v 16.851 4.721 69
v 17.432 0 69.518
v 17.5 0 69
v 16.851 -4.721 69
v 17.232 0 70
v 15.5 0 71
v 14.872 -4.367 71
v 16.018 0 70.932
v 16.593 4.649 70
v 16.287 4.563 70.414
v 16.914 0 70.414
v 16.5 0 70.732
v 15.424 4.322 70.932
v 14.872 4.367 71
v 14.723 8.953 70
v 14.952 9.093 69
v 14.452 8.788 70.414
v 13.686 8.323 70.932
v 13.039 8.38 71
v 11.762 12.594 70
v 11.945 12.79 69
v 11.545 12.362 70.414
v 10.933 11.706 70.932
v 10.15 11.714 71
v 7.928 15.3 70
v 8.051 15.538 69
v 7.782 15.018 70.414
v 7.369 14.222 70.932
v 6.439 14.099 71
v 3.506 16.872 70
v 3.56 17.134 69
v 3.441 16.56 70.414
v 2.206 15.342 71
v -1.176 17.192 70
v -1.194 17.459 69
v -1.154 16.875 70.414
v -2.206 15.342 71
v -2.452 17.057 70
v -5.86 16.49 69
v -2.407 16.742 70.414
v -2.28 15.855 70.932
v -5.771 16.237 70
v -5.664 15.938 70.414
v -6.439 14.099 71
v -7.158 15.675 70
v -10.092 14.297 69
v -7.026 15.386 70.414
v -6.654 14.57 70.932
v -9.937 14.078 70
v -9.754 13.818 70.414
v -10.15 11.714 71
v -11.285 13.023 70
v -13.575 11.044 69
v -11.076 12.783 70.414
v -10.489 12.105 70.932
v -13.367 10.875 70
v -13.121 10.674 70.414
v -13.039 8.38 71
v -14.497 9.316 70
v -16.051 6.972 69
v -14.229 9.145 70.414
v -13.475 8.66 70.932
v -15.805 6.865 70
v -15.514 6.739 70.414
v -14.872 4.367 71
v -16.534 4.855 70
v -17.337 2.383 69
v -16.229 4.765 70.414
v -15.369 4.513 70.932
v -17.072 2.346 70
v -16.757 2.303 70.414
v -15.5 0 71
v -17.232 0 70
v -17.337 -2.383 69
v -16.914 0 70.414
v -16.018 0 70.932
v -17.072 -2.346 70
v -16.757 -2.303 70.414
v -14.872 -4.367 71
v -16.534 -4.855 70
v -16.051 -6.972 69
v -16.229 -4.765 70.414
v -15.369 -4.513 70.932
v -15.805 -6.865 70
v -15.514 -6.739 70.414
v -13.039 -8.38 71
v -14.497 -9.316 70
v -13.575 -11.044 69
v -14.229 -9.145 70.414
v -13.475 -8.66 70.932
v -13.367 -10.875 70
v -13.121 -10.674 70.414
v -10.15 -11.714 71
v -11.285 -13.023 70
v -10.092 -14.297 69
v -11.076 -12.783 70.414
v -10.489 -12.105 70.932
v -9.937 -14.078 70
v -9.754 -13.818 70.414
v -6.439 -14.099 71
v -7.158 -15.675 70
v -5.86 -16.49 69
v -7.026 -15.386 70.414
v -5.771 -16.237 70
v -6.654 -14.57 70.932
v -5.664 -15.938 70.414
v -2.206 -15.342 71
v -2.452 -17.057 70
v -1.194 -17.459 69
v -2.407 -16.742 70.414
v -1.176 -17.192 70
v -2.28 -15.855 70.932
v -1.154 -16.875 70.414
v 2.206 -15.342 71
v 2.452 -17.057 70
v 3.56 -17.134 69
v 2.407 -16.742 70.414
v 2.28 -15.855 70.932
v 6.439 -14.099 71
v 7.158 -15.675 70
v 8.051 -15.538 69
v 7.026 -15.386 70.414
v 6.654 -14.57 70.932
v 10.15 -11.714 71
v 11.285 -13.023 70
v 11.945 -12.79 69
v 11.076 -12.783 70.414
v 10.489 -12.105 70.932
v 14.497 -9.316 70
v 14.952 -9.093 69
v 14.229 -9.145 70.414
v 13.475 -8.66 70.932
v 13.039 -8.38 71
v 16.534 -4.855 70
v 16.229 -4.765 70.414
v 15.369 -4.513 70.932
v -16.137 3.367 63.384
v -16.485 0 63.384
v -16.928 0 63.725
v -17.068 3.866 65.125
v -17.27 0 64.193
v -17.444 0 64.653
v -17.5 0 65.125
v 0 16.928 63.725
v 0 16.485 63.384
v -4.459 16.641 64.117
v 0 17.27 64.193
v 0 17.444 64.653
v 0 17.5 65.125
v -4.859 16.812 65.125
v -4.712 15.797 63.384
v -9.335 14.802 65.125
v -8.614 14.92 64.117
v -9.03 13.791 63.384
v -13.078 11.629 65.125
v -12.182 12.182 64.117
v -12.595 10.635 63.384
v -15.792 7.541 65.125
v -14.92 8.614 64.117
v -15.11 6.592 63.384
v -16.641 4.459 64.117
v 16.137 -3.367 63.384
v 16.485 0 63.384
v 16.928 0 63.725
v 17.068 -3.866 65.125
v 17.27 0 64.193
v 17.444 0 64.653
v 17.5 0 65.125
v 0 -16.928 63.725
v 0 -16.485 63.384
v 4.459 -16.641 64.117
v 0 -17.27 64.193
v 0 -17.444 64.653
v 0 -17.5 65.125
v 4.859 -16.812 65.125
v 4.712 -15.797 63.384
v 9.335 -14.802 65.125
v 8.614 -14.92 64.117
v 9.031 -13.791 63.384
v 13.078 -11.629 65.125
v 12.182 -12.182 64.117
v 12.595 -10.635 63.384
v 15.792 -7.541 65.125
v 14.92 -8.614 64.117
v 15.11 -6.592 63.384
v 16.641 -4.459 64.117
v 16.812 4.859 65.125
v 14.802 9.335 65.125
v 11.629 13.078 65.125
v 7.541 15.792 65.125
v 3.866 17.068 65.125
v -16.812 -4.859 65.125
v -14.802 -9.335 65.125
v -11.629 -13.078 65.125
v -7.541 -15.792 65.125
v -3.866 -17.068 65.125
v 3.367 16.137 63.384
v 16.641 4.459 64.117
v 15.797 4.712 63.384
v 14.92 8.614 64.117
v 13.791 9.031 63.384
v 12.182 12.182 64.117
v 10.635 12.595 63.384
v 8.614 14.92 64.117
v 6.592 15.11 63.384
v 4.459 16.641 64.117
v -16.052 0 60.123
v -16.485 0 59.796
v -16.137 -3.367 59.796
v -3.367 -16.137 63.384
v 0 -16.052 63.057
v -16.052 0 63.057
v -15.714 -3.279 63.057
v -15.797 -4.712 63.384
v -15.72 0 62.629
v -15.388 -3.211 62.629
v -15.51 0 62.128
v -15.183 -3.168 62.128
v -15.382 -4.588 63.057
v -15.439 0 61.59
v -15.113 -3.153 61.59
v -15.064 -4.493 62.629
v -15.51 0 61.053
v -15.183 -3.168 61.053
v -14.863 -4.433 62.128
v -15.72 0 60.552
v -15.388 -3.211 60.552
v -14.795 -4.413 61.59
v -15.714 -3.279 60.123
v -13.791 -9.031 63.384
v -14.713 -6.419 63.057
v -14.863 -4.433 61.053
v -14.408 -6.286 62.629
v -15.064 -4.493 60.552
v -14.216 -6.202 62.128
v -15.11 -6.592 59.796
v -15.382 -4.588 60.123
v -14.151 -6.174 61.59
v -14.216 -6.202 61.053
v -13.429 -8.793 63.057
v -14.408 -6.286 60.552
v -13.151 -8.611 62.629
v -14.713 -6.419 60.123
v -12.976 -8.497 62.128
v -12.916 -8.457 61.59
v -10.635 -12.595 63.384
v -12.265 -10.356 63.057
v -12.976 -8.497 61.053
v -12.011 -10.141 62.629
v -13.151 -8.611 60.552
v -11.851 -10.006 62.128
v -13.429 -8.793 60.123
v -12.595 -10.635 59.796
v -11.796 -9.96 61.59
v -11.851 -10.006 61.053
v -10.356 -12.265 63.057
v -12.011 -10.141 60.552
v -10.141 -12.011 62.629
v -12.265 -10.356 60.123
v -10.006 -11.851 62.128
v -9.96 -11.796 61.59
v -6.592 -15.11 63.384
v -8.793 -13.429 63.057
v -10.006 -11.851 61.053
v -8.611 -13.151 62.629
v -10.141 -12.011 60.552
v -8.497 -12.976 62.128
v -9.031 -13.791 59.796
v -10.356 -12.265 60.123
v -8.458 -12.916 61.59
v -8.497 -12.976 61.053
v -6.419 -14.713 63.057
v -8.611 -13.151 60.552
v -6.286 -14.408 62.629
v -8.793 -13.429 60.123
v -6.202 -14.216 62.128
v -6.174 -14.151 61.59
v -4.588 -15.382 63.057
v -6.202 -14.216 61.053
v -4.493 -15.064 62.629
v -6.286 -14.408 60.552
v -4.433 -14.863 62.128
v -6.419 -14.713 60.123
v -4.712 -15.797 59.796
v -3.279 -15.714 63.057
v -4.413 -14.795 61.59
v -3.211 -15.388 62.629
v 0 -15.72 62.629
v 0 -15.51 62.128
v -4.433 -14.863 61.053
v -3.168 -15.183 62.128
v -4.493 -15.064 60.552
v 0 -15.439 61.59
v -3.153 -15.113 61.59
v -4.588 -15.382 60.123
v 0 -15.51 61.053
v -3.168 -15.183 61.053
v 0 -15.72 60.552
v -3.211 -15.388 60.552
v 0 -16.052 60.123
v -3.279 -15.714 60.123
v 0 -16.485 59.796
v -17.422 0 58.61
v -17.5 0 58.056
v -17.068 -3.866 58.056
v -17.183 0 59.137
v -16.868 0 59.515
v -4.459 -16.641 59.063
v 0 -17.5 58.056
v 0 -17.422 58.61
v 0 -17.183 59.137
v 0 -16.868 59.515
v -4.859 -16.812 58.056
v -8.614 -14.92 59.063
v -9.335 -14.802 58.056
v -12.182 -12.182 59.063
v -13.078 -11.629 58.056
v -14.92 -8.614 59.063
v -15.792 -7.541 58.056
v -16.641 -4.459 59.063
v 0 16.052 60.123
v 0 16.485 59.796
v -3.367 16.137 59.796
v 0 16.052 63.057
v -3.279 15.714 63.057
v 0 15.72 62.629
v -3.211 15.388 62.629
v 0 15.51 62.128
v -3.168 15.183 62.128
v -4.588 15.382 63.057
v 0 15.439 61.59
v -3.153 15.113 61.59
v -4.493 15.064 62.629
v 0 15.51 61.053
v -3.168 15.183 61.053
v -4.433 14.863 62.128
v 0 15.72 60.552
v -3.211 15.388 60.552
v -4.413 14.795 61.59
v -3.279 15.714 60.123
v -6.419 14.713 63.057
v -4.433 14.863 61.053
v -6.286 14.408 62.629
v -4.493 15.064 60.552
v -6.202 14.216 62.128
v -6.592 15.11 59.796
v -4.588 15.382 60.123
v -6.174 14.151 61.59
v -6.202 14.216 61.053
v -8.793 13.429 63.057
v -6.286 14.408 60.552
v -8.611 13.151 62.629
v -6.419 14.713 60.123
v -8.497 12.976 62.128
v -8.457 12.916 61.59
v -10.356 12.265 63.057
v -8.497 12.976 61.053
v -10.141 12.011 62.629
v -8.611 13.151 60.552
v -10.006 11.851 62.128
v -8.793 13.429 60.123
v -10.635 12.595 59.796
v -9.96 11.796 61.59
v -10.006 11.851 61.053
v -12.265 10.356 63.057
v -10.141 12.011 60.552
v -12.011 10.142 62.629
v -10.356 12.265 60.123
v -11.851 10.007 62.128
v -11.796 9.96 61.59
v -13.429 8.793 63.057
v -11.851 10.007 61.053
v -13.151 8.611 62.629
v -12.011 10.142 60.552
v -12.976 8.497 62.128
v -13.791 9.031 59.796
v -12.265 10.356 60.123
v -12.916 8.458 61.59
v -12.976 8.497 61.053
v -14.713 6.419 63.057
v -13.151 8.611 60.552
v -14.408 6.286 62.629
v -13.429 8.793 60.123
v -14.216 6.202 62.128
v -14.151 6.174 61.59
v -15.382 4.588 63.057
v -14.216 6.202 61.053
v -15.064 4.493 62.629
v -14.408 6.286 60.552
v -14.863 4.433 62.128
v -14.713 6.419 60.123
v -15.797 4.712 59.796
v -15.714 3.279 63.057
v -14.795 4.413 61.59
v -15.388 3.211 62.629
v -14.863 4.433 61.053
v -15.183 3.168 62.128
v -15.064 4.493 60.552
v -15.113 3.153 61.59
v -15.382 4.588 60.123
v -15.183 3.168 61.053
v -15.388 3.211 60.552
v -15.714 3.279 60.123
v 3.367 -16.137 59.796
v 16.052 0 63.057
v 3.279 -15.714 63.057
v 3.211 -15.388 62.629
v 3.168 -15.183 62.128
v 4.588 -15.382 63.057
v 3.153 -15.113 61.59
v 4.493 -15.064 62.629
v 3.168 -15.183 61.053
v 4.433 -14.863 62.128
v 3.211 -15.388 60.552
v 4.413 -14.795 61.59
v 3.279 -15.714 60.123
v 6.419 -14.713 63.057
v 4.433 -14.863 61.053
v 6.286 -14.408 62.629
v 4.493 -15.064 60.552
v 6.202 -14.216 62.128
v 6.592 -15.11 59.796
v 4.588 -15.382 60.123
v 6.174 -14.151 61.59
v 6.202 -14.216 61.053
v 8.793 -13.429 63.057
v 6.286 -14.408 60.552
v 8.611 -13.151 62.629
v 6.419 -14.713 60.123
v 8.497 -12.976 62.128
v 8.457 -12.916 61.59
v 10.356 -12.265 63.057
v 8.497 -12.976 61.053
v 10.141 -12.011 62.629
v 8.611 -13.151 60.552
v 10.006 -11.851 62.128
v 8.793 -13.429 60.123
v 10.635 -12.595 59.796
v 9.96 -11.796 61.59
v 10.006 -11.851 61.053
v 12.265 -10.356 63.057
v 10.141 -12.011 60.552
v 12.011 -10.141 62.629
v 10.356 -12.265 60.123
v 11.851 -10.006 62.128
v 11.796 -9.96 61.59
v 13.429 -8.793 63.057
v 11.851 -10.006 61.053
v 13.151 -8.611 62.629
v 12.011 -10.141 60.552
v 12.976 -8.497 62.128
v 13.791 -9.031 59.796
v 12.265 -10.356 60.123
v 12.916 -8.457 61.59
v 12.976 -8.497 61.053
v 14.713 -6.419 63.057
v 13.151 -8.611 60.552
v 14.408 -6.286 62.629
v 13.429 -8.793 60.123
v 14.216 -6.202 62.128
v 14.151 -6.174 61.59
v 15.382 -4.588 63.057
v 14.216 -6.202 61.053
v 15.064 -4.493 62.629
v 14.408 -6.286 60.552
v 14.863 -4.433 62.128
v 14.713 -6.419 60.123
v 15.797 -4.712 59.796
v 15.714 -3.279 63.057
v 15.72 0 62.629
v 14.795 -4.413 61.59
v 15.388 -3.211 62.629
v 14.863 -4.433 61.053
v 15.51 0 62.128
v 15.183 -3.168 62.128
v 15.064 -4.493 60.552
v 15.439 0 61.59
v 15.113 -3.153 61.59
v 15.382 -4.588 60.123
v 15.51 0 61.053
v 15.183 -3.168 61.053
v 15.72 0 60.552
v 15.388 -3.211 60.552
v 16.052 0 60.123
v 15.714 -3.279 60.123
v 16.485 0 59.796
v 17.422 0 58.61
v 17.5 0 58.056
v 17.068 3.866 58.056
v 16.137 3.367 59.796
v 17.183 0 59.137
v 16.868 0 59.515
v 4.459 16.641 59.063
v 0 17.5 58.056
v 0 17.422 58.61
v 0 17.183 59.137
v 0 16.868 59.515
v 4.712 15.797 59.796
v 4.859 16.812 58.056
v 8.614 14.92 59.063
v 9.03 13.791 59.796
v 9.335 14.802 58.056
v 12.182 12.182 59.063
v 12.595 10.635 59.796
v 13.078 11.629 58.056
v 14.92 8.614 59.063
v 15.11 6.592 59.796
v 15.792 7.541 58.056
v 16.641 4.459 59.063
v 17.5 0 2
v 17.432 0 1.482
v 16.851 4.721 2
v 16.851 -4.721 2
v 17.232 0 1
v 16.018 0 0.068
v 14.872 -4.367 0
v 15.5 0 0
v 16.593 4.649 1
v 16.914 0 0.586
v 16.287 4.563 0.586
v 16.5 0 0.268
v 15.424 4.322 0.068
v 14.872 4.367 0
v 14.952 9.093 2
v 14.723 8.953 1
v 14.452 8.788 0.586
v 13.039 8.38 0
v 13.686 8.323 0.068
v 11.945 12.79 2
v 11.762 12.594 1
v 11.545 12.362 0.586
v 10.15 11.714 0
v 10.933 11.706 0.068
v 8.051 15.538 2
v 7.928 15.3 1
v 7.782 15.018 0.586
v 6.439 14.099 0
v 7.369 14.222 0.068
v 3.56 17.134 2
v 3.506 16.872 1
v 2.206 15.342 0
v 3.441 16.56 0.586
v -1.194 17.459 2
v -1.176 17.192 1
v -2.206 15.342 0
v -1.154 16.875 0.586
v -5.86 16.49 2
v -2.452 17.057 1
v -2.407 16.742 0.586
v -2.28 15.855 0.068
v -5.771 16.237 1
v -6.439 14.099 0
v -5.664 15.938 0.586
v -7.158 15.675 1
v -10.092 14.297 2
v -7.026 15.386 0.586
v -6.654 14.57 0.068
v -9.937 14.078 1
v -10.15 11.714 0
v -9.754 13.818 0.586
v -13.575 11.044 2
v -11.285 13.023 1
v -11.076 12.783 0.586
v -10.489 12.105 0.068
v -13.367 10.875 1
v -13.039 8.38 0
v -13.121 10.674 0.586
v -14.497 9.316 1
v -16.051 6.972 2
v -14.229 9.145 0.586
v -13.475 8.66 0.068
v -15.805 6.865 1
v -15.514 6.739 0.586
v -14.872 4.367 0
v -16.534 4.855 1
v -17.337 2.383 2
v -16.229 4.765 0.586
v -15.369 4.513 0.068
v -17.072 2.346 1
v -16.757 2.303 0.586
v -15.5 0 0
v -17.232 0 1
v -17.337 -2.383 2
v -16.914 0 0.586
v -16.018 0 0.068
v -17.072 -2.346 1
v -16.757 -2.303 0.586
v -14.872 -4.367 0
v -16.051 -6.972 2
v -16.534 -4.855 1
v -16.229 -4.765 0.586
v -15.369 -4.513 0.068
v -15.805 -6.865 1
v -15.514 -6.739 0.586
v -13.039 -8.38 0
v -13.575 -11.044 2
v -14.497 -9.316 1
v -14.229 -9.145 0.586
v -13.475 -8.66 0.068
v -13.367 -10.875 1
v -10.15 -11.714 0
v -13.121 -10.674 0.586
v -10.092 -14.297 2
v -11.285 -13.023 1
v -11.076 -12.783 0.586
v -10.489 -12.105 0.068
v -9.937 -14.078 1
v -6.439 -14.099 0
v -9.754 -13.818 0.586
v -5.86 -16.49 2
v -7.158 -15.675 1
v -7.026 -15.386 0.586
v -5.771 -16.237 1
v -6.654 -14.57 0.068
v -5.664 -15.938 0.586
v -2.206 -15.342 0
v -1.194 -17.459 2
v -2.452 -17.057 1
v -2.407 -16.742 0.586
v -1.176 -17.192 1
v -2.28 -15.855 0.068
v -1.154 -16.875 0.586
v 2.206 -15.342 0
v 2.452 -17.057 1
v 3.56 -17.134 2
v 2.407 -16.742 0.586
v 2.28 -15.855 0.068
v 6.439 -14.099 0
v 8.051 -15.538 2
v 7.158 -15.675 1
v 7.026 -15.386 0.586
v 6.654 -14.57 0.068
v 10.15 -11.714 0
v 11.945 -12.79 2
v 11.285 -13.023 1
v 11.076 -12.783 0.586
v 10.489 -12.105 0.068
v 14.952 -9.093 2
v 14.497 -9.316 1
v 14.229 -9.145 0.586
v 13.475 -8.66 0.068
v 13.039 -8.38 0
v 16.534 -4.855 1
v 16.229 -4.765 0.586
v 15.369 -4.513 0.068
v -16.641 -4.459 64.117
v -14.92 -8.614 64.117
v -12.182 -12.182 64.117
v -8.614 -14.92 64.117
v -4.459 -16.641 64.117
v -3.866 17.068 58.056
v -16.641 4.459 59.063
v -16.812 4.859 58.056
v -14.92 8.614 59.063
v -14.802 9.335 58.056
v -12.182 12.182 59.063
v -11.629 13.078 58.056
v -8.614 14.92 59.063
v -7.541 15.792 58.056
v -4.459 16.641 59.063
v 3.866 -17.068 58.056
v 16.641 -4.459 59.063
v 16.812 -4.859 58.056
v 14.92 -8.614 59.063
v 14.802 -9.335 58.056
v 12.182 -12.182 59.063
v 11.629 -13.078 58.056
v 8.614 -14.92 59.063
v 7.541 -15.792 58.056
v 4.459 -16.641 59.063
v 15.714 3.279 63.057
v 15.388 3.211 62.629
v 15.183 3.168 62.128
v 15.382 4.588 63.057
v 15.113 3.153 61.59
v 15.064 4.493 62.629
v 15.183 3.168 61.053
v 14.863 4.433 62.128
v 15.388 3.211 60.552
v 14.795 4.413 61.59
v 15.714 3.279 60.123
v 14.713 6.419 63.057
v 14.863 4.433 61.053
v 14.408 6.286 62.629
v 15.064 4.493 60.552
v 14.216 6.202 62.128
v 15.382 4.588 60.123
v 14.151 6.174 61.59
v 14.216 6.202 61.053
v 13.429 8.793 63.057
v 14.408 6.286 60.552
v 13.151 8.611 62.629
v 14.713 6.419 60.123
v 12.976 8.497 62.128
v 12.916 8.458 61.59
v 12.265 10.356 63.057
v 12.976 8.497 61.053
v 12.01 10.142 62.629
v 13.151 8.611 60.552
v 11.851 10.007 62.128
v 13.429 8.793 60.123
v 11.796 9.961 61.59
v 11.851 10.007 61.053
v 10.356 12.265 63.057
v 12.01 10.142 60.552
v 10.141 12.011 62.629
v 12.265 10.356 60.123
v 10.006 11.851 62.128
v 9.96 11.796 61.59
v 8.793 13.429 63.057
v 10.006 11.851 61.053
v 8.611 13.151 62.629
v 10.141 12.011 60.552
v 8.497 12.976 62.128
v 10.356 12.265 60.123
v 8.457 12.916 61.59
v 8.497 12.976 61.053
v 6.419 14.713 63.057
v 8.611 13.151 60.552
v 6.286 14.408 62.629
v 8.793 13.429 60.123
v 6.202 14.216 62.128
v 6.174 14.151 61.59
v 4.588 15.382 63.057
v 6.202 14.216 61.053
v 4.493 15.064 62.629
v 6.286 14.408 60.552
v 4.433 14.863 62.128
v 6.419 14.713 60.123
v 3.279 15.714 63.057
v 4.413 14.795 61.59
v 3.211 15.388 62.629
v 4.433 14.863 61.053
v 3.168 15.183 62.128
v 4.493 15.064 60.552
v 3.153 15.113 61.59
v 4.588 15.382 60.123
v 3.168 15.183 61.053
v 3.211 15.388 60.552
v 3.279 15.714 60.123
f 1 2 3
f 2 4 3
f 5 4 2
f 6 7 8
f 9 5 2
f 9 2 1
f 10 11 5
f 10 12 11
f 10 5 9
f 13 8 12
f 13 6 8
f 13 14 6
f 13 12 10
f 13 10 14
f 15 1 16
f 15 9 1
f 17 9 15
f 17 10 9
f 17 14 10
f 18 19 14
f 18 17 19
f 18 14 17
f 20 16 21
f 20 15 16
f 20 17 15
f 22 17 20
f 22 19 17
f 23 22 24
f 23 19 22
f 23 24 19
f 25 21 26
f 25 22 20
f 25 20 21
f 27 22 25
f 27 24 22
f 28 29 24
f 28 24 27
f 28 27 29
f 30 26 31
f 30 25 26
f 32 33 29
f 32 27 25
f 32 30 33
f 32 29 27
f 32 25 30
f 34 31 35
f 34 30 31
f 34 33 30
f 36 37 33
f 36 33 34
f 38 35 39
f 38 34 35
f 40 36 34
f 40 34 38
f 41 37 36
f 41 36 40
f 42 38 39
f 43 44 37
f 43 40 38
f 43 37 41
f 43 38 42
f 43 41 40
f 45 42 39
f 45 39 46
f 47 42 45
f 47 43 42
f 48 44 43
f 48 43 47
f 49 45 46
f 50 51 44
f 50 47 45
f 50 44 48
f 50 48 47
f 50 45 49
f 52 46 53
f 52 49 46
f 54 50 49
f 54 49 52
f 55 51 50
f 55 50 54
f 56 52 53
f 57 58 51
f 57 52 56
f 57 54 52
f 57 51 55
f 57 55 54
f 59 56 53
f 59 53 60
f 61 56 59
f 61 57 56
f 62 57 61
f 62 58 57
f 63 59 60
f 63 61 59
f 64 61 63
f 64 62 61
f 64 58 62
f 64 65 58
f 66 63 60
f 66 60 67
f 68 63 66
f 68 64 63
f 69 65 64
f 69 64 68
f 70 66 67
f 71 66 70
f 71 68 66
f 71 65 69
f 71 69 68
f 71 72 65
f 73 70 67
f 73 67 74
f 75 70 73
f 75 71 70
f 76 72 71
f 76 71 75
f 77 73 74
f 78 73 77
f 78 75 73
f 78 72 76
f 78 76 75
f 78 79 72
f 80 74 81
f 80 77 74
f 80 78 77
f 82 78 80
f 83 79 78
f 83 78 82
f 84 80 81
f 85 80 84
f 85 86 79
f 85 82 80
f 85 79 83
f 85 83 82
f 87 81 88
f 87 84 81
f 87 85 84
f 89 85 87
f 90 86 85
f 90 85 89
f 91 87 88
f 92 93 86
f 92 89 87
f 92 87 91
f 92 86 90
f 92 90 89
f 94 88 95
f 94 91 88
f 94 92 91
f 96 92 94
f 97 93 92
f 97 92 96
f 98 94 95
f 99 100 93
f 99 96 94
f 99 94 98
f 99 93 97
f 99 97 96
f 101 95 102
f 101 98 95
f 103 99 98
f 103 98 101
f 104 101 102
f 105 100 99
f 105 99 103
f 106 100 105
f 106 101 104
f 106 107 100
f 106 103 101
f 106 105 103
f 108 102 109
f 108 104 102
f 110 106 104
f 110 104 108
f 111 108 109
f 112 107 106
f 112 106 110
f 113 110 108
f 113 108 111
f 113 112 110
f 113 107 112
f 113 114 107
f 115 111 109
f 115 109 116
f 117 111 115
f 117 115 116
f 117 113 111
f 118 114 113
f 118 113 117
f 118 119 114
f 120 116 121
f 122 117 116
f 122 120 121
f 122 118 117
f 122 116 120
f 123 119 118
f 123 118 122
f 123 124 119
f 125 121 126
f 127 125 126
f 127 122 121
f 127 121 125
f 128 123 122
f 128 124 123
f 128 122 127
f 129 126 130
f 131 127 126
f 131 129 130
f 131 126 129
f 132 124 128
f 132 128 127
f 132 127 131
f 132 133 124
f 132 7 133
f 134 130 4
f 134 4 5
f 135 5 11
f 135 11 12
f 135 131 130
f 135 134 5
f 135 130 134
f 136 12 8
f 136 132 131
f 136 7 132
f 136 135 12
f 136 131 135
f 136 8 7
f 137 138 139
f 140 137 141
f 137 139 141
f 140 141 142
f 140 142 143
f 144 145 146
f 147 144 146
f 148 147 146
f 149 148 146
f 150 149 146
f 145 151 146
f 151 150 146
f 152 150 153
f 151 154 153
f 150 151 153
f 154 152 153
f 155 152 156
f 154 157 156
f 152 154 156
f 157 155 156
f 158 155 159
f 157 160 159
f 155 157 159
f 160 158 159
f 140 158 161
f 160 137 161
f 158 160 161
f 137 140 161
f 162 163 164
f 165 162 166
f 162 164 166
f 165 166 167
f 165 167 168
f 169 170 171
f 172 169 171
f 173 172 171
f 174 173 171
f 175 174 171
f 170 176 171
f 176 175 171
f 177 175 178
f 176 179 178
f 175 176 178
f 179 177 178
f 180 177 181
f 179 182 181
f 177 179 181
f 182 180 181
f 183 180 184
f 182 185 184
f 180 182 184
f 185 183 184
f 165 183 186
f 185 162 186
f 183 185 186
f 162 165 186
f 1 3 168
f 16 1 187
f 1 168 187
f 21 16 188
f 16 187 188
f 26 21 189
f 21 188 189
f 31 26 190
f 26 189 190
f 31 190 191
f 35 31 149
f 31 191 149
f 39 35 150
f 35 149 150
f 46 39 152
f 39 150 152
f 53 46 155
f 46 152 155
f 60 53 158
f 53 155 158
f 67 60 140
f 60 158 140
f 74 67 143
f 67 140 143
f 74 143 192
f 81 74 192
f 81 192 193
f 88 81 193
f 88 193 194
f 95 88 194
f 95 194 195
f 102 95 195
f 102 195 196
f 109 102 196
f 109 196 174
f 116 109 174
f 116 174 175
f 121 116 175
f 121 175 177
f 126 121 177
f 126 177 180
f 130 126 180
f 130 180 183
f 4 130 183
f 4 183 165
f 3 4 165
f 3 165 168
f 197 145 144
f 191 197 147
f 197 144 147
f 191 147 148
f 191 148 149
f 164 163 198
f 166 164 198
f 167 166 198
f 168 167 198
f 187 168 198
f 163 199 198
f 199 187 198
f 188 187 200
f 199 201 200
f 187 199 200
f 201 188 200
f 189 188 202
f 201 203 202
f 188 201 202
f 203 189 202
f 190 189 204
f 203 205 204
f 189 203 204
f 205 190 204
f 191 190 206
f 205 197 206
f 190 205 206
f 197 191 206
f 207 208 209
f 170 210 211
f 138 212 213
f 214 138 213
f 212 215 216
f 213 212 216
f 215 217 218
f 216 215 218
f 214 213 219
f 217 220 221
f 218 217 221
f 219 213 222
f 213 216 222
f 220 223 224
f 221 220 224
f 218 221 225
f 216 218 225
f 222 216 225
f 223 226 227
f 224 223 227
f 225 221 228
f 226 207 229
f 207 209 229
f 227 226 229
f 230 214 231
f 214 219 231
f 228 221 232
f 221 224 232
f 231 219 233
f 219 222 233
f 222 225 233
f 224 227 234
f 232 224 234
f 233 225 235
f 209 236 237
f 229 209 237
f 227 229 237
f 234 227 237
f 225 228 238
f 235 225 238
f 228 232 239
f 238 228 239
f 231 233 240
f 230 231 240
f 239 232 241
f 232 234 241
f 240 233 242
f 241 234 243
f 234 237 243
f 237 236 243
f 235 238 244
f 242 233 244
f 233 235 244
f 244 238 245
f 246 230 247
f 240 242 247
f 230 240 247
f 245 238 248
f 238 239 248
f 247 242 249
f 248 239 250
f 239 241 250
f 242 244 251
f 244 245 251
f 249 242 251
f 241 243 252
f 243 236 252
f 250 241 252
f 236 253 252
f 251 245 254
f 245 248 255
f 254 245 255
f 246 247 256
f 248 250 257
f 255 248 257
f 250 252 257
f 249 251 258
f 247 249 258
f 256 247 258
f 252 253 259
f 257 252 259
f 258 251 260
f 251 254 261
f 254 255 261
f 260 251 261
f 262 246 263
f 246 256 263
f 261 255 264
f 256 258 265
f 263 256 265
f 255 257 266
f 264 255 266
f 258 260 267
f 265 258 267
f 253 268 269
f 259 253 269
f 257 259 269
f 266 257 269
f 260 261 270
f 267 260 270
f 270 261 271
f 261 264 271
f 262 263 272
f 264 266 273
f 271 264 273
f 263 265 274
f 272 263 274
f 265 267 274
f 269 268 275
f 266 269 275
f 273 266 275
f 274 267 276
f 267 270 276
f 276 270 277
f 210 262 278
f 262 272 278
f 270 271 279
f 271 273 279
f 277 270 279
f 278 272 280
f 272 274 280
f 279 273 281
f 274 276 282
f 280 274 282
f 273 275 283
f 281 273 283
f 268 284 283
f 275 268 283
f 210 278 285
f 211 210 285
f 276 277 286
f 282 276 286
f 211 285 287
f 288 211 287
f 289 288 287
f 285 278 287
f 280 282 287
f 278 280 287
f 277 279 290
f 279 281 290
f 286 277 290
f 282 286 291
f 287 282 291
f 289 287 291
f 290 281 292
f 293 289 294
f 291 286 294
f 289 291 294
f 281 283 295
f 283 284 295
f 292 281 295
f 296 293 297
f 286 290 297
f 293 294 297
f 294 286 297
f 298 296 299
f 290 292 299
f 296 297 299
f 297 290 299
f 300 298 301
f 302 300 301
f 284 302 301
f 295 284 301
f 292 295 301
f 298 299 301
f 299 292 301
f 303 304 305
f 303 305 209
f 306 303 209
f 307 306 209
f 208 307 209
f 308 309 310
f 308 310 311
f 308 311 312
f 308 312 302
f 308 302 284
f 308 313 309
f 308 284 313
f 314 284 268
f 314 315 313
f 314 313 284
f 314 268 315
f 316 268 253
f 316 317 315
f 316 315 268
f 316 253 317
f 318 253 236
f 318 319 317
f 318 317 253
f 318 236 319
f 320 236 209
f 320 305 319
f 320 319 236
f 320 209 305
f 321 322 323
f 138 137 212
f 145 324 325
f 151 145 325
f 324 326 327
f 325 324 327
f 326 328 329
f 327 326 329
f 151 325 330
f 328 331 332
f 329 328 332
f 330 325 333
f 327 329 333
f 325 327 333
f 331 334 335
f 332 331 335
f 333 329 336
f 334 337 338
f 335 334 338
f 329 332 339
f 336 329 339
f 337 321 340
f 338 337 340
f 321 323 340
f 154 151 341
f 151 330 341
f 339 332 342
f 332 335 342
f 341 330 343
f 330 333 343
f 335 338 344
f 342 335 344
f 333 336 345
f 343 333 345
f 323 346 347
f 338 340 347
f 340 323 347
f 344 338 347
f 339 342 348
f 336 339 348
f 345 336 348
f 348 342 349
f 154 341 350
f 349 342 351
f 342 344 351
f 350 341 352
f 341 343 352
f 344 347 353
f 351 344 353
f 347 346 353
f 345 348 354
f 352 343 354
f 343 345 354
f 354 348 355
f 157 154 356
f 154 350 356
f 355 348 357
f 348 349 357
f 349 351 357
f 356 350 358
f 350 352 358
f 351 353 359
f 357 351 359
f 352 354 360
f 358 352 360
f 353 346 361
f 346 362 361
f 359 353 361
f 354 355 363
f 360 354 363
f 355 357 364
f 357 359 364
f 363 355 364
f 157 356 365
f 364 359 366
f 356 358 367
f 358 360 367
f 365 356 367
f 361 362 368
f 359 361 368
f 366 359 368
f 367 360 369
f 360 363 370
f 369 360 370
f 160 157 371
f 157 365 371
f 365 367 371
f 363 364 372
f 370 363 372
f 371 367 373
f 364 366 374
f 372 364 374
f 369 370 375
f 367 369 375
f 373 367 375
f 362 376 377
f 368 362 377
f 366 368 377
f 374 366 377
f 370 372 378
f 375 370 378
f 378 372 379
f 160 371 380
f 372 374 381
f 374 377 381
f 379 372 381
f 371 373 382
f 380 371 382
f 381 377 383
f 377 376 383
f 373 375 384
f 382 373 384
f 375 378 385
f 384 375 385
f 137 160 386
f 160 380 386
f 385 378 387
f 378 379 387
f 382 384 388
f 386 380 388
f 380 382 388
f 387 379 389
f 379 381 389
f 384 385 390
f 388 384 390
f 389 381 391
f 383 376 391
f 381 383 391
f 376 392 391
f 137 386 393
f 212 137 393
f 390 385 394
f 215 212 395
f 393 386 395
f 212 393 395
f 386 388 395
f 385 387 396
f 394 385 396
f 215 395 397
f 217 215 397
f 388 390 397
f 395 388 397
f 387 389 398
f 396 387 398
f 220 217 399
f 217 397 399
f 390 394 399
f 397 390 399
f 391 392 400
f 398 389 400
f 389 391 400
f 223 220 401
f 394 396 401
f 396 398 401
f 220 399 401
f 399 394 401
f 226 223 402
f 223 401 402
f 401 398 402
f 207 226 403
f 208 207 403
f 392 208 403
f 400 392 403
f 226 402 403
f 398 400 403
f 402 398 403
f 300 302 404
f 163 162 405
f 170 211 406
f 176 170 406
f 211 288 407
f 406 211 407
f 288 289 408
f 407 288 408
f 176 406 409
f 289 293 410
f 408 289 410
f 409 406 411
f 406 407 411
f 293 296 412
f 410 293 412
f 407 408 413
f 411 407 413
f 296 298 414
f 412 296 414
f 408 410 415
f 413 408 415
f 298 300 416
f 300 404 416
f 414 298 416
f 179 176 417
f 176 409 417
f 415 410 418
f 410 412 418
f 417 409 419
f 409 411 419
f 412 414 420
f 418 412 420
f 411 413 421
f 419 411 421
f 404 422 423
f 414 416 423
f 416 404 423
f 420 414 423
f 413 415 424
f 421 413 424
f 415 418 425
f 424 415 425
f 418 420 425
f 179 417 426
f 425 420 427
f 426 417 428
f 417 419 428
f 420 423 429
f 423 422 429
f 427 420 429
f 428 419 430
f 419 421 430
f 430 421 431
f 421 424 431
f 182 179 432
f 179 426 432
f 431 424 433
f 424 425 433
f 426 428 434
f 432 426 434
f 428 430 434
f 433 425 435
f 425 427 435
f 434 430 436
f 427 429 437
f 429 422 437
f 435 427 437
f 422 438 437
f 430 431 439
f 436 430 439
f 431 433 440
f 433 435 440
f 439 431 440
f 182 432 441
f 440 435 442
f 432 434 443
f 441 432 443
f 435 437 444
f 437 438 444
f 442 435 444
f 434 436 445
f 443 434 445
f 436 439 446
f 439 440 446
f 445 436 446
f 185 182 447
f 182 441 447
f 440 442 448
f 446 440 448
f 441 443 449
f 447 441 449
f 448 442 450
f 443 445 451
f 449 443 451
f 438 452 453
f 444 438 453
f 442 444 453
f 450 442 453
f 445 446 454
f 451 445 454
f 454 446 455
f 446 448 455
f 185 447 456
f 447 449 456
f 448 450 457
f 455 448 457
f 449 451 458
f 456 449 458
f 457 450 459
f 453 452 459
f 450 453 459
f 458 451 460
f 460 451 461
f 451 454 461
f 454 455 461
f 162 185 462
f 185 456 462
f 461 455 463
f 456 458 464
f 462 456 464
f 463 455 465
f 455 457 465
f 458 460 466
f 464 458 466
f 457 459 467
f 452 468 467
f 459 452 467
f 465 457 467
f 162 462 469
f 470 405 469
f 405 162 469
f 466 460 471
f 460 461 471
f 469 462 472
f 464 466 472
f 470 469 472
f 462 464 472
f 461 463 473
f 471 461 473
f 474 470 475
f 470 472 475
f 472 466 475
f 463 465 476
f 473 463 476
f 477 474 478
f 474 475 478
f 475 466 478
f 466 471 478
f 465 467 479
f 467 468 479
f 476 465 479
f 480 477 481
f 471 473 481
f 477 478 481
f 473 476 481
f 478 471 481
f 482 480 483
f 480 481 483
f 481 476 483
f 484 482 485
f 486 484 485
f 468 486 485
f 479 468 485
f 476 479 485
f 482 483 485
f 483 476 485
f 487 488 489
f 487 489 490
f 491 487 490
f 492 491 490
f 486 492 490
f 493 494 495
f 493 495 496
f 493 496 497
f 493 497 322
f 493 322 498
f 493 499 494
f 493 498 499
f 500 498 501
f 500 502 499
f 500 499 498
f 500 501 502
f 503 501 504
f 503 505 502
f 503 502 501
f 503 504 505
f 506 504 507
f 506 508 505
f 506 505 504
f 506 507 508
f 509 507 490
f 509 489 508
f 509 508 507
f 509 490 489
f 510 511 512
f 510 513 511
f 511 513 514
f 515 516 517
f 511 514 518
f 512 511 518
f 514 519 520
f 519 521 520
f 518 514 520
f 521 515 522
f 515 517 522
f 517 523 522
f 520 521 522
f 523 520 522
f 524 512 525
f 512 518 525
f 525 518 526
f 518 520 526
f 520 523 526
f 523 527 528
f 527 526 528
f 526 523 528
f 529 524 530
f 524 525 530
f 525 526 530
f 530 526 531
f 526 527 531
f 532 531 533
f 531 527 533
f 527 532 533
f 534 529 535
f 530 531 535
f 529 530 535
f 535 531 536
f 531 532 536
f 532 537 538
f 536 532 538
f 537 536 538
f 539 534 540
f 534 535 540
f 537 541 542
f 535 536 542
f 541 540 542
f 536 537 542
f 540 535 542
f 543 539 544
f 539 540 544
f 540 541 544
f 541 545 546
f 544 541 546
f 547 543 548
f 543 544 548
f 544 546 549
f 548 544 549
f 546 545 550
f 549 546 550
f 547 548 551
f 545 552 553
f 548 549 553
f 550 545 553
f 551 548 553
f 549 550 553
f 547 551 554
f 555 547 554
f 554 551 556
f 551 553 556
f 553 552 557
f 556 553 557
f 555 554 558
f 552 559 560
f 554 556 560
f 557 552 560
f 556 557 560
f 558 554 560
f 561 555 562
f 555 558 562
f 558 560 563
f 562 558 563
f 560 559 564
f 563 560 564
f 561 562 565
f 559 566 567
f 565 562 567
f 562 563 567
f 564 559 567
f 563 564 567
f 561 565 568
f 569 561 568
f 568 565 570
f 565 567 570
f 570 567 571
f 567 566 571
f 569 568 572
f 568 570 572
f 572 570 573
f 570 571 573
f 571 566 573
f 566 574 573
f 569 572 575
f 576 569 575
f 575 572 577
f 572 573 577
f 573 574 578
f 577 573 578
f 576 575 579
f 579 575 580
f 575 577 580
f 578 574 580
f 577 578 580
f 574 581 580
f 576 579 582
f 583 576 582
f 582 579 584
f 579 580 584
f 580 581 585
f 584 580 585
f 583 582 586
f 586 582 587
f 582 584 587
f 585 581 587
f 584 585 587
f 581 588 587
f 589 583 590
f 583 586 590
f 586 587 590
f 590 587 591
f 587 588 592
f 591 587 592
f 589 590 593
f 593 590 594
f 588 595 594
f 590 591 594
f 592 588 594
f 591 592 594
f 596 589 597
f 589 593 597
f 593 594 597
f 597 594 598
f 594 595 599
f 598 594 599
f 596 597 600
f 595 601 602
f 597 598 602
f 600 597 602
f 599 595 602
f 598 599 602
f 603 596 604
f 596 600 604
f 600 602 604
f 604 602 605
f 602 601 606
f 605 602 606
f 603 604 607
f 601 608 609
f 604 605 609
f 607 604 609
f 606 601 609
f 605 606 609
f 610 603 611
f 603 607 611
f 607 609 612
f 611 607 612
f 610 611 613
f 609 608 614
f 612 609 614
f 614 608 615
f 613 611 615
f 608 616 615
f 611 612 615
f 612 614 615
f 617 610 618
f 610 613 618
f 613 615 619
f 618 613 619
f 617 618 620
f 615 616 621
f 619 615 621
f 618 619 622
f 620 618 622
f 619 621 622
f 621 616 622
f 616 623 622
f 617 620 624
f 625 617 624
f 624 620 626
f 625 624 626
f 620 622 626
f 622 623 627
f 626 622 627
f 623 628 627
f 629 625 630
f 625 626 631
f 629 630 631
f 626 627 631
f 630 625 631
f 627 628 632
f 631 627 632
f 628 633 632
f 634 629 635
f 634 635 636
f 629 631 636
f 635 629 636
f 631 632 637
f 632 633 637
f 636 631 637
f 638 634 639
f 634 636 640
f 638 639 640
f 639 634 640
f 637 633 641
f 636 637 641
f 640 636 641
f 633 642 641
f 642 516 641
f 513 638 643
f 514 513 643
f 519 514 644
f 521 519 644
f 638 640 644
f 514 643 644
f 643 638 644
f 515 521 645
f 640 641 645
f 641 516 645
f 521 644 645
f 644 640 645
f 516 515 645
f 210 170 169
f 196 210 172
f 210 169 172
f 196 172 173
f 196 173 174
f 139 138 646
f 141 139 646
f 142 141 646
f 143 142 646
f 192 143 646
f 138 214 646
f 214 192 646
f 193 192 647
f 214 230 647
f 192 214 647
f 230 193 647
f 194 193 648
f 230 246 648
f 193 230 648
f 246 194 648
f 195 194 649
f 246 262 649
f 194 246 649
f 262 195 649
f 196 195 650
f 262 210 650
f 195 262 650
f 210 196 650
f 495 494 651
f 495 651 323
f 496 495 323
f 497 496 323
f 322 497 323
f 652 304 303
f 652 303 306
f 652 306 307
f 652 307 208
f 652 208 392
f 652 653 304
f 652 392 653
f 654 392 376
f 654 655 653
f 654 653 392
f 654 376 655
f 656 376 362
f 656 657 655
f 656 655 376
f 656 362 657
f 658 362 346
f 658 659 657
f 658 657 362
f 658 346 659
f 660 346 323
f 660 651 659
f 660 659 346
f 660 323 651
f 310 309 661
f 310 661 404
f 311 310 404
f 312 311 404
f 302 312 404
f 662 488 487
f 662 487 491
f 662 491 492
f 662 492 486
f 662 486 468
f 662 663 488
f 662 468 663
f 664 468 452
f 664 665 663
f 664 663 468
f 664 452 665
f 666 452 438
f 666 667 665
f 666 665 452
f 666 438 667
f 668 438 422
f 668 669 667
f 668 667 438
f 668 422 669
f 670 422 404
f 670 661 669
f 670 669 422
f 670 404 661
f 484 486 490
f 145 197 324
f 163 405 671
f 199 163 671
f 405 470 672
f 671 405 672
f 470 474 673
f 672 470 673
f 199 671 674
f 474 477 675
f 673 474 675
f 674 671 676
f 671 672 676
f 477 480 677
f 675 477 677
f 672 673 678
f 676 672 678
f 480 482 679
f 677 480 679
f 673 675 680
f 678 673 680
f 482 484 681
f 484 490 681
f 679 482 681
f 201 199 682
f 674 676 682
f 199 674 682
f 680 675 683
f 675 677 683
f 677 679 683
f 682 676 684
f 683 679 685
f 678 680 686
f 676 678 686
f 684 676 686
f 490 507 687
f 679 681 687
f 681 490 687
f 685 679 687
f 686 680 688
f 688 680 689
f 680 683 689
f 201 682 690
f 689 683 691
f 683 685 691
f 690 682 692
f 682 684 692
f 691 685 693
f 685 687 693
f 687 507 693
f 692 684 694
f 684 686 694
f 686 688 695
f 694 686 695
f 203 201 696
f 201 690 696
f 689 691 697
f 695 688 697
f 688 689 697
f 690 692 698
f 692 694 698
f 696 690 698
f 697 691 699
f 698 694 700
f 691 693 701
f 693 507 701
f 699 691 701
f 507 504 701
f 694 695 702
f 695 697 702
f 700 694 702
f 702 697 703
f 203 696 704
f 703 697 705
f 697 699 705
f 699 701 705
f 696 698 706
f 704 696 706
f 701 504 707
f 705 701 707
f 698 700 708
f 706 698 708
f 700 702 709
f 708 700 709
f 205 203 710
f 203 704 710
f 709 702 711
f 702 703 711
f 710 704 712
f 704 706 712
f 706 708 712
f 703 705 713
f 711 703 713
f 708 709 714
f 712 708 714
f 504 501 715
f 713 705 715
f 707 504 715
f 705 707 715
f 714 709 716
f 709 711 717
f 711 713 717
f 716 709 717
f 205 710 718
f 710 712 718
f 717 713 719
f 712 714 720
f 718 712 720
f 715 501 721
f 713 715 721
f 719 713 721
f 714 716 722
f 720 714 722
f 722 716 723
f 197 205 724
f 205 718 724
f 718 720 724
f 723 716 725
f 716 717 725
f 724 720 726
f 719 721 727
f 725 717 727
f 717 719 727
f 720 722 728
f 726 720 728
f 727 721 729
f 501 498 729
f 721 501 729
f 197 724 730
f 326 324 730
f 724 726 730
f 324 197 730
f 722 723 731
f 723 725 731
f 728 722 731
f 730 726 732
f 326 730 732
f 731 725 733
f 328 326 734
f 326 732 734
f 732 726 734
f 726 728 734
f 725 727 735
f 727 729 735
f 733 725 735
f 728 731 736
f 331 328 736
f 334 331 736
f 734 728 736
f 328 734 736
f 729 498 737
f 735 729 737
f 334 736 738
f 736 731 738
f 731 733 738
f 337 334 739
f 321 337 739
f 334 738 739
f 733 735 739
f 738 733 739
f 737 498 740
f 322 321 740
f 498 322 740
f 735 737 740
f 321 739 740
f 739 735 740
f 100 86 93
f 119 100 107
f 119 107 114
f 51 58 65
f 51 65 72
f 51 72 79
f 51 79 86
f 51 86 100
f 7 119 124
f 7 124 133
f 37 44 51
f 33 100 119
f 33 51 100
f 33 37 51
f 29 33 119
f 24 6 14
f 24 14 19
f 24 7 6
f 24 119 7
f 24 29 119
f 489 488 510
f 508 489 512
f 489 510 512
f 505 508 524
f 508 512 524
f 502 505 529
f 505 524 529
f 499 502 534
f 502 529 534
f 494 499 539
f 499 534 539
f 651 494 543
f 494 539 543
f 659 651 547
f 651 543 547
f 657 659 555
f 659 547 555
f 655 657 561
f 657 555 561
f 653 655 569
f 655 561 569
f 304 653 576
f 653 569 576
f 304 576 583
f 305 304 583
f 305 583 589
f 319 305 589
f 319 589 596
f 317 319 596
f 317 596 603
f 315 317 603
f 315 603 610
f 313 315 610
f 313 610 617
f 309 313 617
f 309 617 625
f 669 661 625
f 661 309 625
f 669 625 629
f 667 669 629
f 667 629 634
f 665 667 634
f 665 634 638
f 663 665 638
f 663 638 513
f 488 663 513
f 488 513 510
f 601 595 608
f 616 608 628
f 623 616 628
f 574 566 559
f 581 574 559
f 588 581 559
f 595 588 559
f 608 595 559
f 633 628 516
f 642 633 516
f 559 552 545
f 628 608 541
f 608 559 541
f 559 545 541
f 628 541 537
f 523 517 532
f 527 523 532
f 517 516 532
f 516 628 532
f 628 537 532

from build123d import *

# Parameters (mm, degrees)
SKETCH1_R           = 17.5
BOSS_EXTRUDE1_DEPTH = 71
FILLET1_R           = 2
SKETCH2_R           = 2.061113782
FILLET2_R           = 2


with BuildPart() as part:
    # Sketch1 → Boss-Extrude1 (new body)
    with BuildSketch(Plane.XY):
        Circle(SKETCH1_R)
    extrude(amount=BOSS_EXTRUDE1_DEPTH)

    # Fillet1
    fillet1_edges = [part.edges().sort_by_distance(p)[0] for p in [
        (-17.5, 0, 0),
        (-17.5, 0, 71),
    ]]
    fillet(fillet1_edges, radius=FILLET1_R)

    # Cut-Sweep1: sweep along a curve in space
    with BuildLine() as cut_sweep1_path:
        ThreePointArc((17.5, 0, 69), (12.374368671, 12.374368671, 69), (0, 17.5, 69))
        ThreePointArc((0, 17.5, 69), (-12.374368671, 12.374368671, 69), (-17.5, 0, 69))
        ThreePointArc((-17.5, 0, 69), (-12.374368671, -12.374368671, 69), (0, -17.5, 69))
        ThreePointArc((0, -17.5, 69), (12.374368671, -12.374368671, 69), (17.5, 0, 69))
    # Sketch2 → Cut-Sweep1 (sweep, cut)
    with BuildSketch(Plane(origin=(0, 0, 0), x_dir=(1, 0, 0), z_dir=(0, 1, 0))):
        with Locations((17.5, -61.590274305)):
            Circle(SKETCH2_R)
    sweep(path=cut_sweep1_path.line, mode=Mode.SUBTRACT)

    # Fillet2
    fillet2_edges = [part.edges().sort_by_distance(p)[0] for p in [
        (-12.374368671, -12.374368671, 63.651388087),
        (12.374368671, -12.374368671, 59.529160523),
    ]]
    fillet(fillet2_edges, radius=FILLET2_R)


solid = part.part
